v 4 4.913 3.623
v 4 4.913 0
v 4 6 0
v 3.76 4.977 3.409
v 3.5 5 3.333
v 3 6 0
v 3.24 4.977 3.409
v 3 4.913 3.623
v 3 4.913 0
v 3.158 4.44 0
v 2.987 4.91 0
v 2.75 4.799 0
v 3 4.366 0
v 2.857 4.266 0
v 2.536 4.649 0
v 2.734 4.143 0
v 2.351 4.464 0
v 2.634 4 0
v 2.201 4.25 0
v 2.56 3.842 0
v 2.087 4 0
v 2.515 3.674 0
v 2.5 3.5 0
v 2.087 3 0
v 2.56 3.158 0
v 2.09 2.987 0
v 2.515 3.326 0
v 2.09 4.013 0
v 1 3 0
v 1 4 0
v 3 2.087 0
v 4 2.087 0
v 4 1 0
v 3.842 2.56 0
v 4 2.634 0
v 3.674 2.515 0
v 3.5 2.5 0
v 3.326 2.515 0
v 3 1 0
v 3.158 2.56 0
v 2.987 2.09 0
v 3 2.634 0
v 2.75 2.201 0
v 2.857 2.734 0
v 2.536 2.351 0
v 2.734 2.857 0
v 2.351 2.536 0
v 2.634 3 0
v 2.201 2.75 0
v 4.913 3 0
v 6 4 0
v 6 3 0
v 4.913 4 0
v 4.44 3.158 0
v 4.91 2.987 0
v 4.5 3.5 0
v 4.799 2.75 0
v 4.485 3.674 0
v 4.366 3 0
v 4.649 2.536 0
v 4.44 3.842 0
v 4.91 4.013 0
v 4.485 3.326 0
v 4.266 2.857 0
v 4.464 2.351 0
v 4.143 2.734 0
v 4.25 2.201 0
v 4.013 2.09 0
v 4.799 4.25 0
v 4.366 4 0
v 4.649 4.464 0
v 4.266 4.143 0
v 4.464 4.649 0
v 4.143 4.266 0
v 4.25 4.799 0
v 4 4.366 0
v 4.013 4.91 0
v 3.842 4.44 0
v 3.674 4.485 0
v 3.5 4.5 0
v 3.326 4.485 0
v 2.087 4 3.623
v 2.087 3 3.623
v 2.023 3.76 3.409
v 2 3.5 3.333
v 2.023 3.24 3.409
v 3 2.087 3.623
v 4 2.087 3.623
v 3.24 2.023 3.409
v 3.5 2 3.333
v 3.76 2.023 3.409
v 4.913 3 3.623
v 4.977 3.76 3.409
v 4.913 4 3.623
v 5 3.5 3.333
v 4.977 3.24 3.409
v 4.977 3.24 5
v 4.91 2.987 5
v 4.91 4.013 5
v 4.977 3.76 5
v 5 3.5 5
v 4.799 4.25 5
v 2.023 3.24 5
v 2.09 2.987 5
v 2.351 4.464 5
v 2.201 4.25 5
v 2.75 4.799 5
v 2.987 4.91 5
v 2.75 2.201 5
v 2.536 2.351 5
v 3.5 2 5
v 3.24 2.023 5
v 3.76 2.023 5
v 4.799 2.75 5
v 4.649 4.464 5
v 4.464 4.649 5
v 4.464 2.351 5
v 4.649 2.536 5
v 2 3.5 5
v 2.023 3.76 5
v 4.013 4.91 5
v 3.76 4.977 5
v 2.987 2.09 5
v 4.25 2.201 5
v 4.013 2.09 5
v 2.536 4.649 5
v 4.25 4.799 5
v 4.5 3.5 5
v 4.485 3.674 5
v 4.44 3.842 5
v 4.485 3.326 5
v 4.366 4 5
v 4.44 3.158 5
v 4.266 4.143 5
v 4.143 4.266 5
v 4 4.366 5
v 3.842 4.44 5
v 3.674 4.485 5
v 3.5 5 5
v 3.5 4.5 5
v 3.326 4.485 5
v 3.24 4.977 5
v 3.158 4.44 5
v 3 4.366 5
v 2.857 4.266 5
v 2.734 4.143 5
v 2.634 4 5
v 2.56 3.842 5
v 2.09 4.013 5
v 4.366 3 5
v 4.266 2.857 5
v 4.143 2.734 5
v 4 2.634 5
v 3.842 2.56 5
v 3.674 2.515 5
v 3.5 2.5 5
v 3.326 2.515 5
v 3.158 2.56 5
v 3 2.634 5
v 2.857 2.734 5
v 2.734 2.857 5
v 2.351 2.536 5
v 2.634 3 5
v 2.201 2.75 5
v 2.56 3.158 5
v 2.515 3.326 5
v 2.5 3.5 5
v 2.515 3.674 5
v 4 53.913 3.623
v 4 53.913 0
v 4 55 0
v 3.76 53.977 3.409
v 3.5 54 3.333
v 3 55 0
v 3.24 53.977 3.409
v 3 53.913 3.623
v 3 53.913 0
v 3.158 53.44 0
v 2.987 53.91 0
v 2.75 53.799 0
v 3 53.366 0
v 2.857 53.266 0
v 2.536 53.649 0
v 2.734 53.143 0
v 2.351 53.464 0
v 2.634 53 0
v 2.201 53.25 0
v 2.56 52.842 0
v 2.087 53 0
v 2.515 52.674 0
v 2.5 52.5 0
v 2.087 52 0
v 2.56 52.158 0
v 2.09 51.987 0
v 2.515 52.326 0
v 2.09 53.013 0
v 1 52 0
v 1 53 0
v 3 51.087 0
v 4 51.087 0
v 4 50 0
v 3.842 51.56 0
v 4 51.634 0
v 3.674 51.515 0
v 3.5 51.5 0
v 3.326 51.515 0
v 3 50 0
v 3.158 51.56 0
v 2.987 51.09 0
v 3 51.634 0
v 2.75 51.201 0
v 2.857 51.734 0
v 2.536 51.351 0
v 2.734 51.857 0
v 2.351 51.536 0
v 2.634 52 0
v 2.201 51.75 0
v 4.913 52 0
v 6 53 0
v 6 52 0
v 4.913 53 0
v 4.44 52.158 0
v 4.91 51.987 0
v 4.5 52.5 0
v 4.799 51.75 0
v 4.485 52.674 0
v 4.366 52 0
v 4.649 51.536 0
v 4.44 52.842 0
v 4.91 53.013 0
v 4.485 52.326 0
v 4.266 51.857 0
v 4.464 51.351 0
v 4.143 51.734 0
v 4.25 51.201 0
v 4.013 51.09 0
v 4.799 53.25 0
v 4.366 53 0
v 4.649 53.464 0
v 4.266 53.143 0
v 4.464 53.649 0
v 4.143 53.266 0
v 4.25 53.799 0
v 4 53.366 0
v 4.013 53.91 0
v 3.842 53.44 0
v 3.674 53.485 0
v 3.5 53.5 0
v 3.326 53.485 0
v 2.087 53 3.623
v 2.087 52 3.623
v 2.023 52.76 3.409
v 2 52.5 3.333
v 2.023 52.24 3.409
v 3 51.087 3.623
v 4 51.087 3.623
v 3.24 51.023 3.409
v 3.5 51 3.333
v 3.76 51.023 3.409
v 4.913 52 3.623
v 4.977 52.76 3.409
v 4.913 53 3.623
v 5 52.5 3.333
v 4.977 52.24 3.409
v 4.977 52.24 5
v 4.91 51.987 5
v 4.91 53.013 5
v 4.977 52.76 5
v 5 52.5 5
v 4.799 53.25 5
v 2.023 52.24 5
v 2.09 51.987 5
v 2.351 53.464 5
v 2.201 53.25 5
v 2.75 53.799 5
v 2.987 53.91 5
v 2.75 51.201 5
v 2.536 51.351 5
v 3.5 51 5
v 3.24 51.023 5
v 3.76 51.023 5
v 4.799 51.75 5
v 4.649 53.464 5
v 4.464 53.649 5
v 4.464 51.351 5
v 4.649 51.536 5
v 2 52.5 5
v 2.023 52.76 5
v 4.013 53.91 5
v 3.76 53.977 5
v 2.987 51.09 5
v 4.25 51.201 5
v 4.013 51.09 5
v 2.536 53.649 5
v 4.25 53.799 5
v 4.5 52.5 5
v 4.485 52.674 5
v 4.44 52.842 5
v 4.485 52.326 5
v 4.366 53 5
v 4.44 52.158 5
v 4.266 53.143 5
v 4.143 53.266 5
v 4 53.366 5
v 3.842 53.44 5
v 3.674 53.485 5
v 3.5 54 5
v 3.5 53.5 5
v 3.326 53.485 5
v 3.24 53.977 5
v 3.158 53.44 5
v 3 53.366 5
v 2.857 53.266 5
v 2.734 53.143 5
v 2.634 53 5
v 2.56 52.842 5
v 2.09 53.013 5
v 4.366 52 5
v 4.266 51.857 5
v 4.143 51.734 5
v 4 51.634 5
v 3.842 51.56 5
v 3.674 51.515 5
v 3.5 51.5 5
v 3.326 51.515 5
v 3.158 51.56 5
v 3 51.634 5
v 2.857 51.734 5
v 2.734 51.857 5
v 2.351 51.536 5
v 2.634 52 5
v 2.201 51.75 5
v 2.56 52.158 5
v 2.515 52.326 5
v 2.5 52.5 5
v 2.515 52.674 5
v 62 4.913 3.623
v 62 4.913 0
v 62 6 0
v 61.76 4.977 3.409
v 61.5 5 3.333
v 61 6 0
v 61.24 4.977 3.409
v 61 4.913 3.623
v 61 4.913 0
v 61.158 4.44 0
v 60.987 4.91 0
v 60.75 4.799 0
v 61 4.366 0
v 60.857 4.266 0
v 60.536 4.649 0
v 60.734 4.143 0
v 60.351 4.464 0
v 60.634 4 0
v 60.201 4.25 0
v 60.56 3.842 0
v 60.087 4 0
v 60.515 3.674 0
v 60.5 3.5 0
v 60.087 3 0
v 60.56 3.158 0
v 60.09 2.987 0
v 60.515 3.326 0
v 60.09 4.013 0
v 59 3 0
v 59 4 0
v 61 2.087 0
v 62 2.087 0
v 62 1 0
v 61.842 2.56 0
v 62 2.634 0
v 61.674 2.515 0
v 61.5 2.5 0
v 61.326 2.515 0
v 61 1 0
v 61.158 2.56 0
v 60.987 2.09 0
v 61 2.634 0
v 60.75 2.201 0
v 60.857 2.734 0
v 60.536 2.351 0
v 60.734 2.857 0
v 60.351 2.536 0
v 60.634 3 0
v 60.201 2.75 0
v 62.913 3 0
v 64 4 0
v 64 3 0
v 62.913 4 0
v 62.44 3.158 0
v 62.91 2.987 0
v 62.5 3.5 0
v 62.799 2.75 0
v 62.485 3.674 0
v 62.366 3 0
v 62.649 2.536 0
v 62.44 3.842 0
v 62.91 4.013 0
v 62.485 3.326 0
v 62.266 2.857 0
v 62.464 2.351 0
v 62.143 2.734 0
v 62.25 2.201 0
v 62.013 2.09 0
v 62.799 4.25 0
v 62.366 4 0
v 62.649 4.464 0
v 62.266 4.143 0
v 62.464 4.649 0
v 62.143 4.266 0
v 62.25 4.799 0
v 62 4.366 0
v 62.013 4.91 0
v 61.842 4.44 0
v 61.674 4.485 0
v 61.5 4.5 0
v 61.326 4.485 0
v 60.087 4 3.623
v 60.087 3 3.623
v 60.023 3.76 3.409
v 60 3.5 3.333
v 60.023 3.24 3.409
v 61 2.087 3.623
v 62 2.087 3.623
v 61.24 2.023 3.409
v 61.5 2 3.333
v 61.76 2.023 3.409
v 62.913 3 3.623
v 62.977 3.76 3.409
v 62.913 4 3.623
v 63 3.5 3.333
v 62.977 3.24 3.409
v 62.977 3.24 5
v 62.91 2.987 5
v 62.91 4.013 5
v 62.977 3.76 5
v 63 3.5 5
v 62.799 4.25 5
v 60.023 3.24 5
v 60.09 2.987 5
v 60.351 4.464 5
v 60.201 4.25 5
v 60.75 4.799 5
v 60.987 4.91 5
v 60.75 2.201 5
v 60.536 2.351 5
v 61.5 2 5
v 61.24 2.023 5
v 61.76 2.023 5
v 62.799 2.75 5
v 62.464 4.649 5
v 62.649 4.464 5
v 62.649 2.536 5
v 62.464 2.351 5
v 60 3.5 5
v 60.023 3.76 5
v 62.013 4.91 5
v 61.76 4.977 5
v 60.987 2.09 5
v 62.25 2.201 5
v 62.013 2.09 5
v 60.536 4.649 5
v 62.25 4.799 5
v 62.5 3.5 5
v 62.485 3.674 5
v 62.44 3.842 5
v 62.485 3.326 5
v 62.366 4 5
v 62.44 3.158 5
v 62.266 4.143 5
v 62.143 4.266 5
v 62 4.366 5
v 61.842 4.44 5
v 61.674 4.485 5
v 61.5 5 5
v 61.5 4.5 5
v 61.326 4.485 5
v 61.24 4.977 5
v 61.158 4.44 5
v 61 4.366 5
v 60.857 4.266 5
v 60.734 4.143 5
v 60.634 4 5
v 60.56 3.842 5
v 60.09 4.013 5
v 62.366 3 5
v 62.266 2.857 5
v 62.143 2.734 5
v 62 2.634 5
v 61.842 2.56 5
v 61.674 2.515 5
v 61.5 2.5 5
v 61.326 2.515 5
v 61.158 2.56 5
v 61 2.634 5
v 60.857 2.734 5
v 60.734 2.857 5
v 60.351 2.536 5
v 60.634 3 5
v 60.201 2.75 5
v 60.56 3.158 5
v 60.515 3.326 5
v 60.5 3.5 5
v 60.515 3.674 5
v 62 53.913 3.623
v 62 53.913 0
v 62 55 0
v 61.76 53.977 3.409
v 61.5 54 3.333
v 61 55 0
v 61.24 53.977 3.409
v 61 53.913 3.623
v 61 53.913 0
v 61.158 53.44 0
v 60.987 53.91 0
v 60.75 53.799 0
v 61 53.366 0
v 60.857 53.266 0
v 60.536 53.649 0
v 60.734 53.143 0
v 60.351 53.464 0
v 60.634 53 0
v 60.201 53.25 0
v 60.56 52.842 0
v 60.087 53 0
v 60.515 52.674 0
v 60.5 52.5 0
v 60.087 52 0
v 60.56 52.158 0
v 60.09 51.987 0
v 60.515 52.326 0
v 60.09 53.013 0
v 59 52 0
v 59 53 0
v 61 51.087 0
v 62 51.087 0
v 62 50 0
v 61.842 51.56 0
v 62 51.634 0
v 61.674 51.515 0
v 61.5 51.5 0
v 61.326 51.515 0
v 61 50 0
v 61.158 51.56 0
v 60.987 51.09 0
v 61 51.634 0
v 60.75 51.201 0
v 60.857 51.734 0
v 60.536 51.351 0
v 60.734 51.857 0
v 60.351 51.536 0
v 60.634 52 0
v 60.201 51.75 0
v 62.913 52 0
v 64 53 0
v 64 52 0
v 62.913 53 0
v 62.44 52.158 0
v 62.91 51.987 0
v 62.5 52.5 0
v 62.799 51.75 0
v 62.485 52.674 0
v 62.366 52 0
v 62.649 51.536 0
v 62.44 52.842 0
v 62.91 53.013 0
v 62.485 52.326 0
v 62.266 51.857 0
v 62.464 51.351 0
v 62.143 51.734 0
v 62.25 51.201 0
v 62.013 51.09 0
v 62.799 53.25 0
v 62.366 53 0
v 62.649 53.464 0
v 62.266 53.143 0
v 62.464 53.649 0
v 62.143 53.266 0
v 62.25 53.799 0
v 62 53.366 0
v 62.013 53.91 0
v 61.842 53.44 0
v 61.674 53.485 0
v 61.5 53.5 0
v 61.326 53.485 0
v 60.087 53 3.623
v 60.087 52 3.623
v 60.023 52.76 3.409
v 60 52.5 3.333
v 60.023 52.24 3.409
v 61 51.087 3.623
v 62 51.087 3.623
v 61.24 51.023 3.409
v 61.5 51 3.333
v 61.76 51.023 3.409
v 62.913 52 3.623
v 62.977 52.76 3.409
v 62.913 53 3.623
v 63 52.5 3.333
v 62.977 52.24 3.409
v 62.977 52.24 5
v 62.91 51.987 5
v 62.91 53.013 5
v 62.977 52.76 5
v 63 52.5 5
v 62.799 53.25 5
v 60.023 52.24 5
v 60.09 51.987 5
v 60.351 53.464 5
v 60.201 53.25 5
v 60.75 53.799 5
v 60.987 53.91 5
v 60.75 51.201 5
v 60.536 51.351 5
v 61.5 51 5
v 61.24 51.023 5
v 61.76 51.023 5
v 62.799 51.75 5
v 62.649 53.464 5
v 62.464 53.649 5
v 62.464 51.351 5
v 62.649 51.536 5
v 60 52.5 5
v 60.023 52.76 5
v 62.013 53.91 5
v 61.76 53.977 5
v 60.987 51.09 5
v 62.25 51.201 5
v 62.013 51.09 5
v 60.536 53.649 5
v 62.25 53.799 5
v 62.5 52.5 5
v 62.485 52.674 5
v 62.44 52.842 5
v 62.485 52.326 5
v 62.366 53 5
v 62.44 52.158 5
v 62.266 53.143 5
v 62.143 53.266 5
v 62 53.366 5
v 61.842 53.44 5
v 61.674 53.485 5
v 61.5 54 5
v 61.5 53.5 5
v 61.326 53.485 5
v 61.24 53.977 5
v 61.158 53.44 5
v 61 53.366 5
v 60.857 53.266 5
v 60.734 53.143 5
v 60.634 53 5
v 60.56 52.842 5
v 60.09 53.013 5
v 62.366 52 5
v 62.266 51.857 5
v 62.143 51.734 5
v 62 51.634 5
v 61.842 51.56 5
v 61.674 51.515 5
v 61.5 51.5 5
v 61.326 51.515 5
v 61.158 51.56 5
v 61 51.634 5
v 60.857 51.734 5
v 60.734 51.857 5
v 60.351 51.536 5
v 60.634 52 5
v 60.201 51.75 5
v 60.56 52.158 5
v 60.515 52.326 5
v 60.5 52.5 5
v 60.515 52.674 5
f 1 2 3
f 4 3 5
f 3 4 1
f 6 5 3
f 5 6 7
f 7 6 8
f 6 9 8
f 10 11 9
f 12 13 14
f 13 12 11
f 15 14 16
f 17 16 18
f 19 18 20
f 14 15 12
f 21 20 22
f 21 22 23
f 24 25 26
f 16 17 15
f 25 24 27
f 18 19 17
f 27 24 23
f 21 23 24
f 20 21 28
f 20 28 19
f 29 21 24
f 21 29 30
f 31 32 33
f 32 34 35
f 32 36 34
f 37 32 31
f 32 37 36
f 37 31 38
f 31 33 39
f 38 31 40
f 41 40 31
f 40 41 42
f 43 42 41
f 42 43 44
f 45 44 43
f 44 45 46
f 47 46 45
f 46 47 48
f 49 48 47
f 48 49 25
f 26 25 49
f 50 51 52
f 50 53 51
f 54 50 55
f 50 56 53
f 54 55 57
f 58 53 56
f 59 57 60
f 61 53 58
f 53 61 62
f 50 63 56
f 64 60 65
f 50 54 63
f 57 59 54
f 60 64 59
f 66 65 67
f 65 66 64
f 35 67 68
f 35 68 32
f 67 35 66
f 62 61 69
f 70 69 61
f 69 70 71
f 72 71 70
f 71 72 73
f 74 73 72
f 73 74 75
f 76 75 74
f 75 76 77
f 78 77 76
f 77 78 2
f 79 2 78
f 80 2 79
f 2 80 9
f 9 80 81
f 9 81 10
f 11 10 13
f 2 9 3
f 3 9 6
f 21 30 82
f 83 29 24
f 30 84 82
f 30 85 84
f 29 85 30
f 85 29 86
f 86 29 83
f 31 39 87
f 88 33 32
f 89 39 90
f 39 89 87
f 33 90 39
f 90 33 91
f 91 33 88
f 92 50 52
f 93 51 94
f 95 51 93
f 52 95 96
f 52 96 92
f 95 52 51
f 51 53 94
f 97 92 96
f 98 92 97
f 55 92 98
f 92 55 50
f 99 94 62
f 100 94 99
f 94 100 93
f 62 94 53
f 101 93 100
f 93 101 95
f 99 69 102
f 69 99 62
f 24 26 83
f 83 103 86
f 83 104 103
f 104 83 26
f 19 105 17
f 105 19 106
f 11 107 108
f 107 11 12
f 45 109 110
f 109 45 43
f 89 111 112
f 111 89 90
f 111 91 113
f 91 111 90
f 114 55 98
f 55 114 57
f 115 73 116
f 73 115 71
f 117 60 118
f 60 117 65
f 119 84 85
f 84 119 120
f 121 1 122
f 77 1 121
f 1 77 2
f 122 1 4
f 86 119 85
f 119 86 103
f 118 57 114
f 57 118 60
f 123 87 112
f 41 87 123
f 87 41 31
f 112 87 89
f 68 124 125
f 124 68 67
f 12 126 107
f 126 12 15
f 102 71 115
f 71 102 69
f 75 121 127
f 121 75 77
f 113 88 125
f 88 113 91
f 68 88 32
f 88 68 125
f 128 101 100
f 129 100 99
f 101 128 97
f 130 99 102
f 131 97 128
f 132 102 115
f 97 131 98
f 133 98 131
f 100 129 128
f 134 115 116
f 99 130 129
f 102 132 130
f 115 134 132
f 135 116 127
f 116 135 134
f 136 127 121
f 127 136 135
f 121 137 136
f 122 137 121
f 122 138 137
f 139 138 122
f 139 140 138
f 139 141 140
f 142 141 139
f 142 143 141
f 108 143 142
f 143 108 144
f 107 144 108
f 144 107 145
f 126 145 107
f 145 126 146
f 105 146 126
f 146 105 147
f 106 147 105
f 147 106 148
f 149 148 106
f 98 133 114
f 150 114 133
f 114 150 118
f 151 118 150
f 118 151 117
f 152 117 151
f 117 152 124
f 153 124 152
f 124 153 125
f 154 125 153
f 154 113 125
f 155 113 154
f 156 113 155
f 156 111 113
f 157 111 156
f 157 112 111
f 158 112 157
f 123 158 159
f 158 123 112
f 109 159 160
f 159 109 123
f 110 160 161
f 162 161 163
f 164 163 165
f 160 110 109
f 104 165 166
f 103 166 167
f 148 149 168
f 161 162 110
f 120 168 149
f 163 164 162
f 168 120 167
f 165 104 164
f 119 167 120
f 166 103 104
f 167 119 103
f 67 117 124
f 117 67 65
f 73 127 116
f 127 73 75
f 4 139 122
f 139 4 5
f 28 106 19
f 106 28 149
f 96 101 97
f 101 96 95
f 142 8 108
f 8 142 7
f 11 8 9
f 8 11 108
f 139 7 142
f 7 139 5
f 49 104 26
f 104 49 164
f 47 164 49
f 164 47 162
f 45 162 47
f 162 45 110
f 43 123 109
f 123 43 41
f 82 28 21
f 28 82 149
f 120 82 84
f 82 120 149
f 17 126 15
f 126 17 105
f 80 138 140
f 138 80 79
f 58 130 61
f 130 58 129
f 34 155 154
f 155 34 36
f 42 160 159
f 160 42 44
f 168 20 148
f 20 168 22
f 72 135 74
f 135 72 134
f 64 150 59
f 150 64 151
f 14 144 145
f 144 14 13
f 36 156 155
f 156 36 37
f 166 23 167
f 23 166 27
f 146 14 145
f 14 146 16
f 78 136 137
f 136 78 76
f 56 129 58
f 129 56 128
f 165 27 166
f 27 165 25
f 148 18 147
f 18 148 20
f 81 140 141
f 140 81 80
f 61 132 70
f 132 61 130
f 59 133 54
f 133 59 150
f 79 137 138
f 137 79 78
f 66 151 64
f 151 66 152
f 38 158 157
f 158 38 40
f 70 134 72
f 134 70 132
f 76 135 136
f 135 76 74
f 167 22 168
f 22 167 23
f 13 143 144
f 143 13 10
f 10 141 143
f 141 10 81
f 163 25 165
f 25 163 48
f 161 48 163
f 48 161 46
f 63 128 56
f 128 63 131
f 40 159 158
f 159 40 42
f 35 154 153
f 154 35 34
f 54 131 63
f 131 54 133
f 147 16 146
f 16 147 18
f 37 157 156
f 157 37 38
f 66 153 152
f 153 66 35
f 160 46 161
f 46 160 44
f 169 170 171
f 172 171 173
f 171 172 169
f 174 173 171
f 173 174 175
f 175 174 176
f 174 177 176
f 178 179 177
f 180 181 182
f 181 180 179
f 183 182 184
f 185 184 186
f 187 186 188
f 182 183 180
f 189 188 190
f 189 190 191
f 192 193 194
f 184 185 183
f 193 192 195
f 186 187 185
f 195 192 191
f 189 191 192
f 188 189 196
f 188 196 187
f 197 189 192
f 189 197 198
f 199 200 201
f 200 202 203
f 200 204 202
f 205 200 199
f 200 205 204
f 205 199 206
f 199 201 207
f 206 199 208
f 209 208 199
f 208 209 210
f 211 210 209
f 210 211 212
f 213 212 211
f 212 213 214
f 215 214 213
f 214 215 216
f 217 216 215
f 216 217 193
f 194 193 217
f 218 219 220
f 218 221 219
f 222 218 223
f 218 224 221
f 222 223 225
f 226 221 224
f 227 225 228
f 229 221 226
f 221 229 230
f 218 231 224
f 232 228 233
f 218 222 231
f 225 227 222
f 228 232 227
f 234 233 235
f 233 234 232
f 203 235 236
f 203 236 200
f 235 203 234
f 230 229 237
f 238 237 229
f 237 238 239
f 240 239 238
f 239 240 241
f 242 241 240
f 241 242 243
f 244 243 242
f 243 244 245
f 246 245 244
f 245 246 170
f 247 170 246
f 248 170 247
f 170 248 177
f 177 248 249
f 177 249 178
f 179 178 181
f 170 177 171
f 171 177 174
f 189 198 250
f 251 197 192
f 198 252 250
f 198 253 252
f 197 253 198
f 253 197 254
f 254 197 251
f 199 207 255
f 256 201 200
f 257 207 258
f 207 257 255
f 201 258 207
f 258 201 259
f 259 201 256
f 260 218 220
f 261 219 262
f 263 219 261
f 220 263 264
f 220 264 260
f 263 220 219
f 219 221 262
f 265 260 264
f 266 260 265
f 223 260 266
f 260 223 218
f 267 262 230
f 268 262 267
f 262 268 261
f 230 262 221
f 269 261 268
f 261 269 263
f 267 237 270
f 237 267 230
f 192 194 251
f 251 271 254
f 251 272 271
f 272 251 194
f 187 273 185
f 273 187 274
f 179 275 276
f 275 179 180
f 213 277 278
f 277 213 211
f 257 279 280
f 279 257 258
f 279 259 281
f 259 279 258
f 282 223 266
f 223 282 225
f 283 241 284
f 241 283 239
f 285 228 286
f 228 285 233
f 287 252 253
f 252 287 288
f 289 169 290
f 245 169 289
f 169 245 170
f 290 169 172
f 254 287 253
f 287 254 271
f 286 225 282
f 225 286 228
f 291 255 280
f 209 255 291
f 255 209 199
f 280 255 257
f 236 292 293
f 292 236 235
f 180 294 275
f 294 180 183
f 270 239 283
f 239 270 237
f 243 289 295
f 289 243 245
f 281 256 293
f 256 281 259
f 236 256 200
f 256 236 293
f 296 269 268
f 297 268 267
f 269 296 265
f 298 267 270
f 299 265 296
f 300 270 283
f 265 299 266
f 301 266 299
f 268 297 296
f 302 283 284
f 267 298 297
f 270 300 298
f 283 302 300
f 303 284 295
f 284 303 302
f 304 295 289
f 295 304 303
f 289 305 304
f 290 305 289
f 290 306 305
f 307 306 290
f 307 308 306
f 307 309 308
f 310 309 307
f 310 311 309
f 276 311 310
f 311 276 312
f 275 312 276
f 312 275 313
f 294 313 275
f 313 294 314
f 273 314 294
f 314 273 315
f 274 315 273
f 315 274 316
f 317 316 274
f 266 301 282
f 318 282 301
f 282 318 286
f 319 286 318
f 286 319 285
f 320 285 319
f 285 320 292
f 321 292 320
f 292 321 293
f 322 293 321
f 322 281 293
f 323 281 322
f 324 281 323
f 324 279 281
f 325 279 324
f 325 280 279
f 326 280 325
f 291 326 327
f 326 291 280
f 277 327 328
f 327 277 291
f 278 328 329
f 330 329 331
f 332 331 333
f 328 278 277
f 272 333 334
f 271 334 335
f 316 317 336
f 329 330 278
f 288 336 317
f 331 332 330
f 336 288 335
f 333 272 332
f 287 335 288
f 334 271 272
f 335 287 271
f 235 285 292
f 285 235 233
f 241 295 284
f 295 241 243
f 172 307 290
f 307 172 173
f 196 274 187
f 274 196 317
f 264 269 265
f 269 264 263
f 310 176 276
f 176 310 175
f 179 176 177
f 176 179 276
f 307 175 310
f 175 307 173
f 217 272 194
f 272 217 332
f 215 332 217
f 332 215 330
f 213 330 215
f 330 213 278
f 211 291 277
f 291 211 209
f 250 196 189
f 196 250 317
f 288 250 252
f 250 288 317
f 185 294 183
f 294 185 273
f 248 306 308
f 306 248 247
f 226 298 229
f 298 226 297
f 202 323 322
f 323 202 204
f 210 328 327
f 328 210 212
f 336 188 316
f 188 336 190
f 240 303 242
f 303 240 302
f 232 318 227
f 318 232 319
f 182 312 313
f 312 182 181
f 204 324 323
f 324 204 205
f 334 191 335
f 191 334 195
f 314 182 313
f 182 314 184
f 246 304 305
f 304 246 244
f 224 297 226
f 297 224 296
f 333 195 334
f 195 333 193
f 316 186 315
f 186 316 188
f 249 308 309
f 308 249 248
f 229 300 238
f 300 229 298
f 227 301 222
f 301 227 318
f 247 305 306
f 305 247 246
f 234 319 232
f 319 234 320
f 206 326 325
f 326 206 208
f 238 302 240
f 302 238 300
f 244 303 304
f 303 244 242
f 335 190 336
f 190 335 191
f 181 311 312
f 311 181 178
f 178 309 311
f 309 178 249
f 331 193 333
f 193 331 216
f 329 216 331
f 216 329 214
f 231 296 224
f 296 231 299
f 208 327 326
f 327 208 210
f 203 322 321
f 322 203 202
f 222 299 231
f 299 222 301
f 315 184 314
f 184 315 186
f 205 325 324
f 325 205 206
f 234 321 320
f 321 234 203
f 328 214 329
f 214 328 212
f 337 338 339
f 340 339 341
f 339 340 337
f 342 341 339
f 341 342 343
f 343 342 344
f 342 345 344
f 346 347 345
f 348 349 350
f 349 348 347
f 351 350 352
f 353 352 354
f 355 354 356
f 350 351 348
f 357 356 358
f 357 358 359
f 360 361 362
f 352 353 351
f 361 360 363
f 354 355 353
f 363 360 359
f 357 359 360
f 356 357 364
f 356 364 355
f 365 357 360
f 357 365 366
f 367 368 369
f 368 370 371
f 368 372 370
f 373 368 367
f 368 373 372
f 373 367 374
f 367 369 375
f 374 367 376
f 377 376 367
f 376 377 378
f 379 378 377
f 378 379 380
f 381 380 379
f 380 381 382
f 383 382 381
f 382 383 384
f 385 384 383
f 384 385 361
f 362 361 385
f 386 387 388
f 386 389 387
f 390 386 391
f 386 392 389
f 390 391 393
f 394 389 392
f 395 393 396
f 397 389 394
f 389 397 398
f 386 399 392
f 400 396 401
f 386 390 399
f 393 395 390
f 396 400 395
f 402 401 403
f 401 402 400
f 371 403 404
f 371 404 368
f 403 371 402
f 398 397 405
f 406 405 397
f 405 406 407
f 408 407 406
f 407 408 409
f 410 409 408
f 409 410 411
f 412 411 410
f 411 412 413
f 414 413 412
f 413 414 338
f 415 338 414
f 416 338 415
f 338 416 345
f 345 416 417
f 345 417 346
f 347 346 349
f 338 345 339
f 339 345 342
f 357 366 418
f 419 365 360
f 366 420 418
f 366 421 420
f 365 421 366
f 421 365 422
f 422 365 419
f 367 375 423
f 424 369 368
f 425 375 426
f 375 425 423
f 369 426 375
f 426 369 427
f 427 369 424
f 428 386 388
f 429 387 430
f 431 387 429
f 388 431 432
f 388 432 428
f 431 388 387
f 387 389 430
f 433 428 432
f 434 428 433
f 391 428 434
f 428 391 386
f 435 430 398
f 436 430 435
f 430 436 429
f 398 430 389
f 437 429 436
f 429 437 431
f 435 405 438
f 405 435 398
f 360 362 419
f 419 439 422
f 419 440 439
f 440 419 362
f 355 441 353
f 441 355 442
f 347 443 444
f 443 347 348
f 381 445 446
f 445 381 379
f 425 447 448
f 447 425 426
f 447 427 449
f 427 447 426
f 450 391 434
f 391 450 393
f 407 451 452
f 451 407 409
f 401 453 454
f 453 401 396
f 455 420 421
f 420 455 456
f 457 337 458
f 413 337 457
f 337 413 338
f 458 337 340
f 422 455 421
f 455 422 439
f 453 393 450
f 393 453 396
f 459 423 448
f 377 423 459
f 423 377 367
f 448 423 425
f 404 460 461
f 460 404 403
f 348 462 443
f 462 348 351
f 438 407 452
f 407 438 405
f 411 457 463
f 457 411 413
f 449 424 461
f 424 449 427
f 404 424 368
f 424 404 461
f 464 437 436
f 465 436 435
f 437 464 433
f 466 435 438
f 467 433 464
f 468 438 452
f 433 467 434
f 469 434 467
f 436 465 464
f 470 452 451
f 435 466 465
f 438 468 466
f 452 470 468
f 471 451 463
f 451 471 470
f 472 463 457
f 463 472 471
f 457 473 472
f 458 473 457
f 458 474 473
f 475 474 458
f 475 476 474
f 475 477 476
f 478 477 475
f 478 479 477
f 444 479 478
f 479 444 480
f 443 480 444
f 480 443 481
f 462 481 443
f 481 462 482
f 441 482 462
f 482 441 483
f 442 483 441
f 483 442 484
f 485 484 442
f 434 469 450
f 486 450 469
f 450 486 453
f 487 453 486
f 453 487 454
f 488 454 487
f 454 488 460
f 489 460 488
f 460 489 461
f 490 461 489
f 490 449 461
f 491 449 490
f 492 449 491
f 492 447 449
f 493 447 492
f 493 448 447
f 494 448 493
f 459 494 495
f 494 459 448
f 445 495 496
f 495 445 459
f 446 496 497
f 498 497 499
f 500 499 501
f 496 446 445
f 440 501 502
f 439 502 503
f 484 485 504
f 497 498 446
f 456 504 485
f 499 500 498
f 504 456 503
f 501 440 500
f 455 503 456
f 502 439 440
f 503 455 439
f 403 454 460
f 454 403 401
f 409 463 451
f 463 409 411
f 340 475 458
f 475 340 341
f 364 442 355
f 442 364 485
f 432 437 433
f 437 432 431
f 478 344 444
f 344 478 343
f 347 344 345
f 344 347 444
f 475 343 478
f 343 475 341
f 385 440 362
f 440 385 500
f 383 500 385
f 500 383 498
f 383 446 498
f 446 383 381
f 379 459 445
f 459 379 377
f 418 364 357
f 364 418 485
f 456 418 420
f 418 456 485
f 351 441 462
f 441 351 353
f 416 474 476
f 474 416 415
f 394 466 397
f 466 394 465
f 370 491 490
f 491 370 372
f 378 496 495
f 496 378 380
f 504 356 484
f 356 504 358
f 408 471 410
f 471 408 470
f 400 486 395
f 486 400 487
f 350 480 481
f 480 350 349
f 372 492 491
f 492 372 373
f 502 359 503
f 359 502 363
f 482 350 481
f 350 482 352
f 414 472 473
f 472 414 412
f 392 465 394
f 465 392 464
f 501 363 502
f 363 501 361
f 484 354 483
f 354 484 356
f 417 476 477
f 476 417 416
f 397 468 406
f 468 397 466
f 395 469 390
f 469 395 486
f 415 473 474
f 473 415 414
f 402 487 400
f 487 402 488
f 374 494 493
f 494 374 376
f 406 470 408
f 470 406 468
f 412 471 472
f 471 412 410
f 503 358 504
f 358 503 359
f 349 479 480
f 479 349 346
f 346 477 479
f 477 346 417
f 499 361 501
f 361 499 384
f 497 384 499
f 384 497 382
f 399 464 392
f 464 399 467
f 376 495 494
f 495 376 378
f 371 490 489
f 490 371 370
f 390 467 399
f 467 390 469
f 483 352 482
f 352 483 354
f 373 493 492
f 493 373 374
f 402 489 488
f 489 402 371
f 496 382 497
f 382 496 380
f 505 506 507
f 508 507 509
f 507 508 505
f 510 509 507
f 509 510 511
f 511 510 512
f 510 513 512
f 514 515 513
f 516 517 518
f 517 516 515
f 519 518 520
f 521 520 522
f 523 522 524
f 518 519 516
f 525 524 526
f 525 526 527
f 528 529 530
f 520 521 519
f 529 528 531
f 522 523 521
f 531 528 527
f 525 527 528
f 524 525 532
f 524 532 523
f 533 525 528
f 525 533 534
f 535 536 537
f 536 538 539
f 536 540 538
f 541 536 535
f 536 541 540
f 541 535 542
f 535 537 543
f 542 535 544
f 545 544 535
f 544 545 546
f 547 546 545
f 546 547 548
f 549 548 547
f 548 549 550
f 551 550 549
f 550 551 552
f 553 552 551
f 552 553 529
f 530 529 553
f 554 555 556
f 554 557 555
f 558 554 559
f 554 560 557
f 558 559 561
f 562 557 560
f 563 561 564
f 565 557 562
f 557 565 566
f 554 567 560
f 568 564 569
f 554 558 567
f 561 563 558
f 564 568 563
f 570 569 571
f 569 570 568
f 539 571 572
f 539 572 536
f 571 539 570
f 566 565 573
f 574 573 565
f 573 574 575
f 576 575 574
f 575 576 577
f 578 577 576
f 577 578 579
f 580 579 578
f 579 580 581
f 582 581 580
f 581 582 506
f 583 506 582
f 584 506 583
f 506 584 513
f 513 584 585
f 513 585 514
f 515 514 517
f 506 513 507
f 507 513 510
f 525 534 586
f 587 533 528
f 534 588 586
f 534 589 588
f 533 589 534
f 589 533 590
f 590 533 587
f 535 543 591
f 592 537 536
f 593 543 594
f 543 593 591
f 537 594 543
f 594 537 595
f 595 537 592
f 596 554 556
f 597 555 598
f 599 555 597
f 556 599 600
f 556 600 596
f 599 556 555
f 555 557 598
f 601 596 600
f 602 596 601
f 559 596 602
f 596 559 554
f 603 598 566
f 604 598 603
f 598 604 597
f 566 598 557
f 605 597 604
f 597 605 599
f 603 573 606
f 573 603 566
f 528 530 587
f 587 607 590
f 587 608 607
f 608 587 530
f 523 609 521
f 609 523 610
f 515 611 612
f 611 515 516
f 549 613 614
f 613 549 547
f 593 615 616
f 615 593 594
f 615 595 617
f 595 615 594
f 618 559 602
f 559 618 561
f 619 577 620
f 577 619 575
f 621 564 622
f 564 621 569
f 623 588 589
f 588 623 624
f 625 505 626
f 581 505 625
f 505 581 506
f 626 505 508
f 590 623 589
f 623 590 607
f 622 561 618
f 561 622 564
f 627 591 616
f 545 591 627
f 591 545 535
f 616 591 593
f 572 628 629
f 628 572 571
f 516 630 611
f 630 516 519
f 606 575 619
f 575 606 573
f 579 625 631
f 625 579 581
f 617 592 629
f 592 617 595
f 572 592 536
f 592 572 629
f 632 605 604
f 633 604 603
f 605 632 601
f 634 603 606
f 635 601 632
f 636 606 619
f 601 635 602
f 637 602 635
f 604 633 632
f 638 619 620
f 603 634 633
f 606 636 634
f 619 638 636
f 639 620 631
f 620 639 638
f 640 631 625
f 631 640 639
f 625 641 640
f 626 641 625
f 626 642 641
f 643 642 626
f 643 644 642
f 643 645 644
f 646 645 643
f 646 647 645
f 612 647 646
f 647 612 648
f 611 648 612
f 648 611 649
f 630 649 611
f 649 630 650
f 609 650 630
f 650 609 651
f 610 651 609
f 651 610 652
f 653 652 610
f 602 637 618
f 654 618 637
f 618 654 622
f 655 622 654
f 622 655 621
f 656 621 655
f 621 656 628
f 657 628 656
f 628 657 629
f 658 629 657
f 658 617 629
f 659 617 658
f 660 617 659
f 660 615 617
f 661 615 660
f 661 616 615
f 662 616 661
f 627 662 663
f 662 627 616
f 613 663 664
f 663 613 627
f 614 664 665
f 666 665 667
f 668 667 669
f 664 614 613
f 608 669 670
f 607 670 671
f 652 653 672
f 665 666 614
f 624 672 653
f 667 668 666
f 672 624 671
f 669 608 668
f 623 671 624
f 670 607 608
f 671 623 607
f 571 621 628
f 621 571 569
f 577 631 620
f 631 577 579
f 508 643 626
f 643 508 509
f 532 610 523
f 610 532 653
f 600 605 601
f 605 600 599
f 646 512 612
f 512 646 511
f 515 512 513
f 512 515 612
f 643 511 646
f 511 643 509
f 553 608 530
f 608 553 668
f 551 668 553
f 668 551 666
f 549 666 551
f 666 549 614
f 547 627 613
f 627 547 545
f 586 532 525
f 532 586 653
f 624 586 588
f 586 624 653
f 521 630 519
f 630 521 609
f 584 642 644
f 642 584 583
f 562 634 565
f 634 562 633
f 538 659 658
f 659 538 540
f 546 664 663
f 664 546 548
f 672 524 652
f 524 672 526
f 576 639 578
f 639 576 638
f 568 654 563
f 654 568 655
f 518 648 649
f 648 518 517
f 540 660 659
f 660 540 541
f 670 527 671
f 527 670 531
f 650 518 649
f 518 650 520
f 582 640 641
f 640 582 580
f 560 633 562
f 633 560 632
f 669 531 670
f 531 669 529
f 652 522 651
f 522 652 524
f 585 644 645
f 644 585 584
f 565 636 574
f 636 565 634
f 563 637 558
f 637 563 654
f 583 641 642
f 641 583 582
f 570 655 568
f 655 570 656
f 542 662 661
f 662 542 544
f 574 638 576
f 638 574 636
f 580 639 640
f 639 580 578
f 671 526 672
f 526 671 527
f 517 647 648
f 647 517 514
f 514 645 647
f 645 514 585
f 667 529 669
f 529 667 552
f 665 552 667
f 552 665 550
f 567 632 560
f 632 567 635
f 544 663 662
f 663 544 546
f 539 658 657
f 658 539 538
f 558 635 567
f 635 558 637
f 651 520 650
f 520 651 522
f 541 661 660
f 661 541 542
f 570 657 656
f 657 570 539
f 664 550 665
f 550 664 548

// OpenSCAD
// file: posts.scad
/* Developed by Alex Grutter */

$fn = 36;

four_posts_with_supports(10, 3, 2, 25, 50, 5, 1, [0,0,0,0], 1, true);

module four_posts(post_height, post_outer_diameter, post_inner_diameter, post_spacing_width, post_spacing_length){
    difference()
    {
		/* Outer part */
		union()
		{
            translate([0, 0, 0])
            {
                cylinder(h = post_height, d = post_outer_diameter);
            }
            translate([0, post_spacing_length + 0, 0])
            {
                cylinder(h = post_height, d = post_outer_diameter);
            }
            translate([post_spacing_width + 0, 0, 0])
            {
                cylinder(h = post_height, d = post_outer_diameter);
            }
            translate([post_spacing_width + 0, post_spacing_length + 0, 0])
            {
                cylinder(h = post_height, d = post_outer_diameter);
            }
		}
		/* Inner hole */
        union()
        {
            translate([0, 0, -1])
            {
                cylinder(h = post_height+2, d = post_inner_diameter);
            }
            translate([0, post_spacing_length + 0, -1])
            {
                cylinder(h = post_height+2, d = post_inner_diameter);
            }
            translate([post_spacing_width + 0, 0, -1])
            {
                cylinder(h = post_height+2, d = post_inner_diameter);
            }
            translate([post_spacing_width + 0, post_spacing_length + 0, -1])
            {
                cylinder(h = post_height+2, d = post_inner_diameter);
            }
        }
	}
};

module four_posts_with_supports(post_height, post_outer_diameter, post_inner_diameter, post_spacing_width, post_spacing_length, support_diameter, support_count, support_start_angle, support_thickness, flip){
    difference()
    {
		/* Outer part */
		union()
		{
            translate([0, 0, 0])
            {
                cylinder(h = post_height, d = post_outer_diameter);
				for(support = [0 : support_count])
				{
					if(flip)
					{
						translate([0, 0, post_height])
						rotate([support_start_angle[0] + ( support * (360 / support_count)),90,0])
						translate([0, 0, -(support_thickness / 2)])
						linear_extrude(support_thickness)
						polygon([[post_height, (post_inner_diameter / 2)],[0, (post_inner_diameter / 2)],[0,(support_diameter / 2)]], [[0,1,2]]);
					}
					else
					{
						rotate([support_start_angle[0] + ( support * (360 / support_count)),-90,0])
						translate([0, 0, -(support_thickness / 2)])
						linear_extrude(support_thickness)
						polygon([[post_height, (post_inner_diameter / 2)],[0, (post_inner_diameter / 2)],[0, (support_diameter / 2)]], [[0,1,2]]);
					}
				}
            }
            translate([0, post_spacing_length + 0, 0])
            {
                cylinder(h = post_height, d = post_outer_diameter);
				for(support = [0 : support_count])
				{
					if(flip)
					{
						translate([0, 0, post_height])
						rotate([support_start_angle[1] + ( support * (360 / support_count)),90,0])
						translate([0, 0, -(support_thickness / 2)])
						linear_extrude(support_thickness)
						polygon([[post_height, (post_inner_diameter / 2)],[0, (post_inner_diameter / 2)],[0,(support_diameter / 2)]], [[0,1,2]]);
					}
					else
					{
						rotate([support_start_angle[1] + ( support * (360 / support_count)),-90,0])
						translate([0, 0, -(support_thickness / 2)])
						linear_extrude(support_thickness)
						polygon([[post_height, (post_inner_diameter / 2)],[0, (post_inner_diameter / 2)],[0,(support_diameter / 2)]], [[0,1,2]]);
					}
				}
            }
            translate([post_spacing_width + 0, 0, 0])
            {
                cylinder(h = post_height, d = post_outer_diameter);
				for(support = [0 : support_count])
				{
					if(flip)
					{
						translate([0, 0, post_height])
						rotate([support_start_angle[2] + ( support * (360 / support_count)),90,0])
						translate([0, 0, -(support_thickness / 2)])
						linear_extrude(support_thickness)
						polygon([[post_height, (post_inner_diameter / 2)],[0, (post_inner_diameter / 2)],[0,(support_diameter / 2)]], [[0,1,2]]);
					}
					else
					{
						rotate([support_start_angle[2] + ( support * (360 / support_count)),-90,0])
						translate([0, 0, -(support_thickness / 2)])
						linear_extrude(support_thickness)
						polygon([[post_height, (post_inner_diameter / 2)],[0, (post_inner_diameter / 2)],[0,(support_diameter / 2)]], [[0,1,2]]);
					}
				}
            }
            translate([post_spacing_width + 0, post_spacing_length + 0, 0])
            {
                cylinder(h = post_height, d = post_outer_diameter);
				for(support = [0 : support_count])
				{
					if(flip)
					{
						translate([0, 0, post_height])
						rotate([support_start_angle[3] + ( support * (360 / support_count)),90,0])
						translate([0, 0, -(support_thickness / 2)])
						linear_extrude(support_thickness)
						polygon([[post_height, (post_inner_diameter / 2)],[0, (post_inner_diameter / 2)],[0,(support_diameter / 2)]], [[0,1,2]]);
					}
					else
					{
						rotate([support_start_angle[3] + ( support * (360 / support_count)),-90,0])
						translate([0, 0, -(support_thickness / 2)])
						linear_extrude(support_thickness)
						polygon([[post_height, (post_inner_diameter / 2)],[0, (post_inner_diameter / 2)],[0,(support_diameter / 2)]], [[0,1,2]]);
					}
				}
            }
		}
        
		/* Inner hole */
        union()
        {
            translate([0, 0, -1])
            {
                cylinder(h = post_height+2, d = post_inner_diameter);
            }
            translate([0, post_spacing_length + 0, -1])
            {
                cylinder(h = post_height+2, d = post_inner_diameter);
            }
            translate([post_spacing_width + 0, 0, -1])
            {
                cylinder(h = post_height+2, d = post_inner_diameter);
            }
            translate([post_spacing_width + 0, post_spacing_length + 0, -1])
            {
                cylinder(h = post_height+2, d = post_inner_diameter);
            }
        }
	}
};
// main file
use <posts.scad>

/* Examples for viewing */
raspberry_pi_model_b_plus_posts();

module raspberry_pi_model_b_plus_posts()
{
    /* Post parameters */
    post_height                 = 5;
    post_outer_diameter         = 3;
    post_inner_diameter         = 2;
    
    /* Post support parameters */
    support_diameter            = 5;
    support_count               = 4;
    support_start_angle         = [0,0,0,0];
    support_thickness           = 1;
    support_flip                = false;
    
    /* Length positioning parameters */
    hole1_offset_length         = 3.5;
    hole2_offset_length         = hole1_offset_length;
    hole3_offset_length         = 3.5 + 58;
    hole4_offset_length         = hole3_offset_length;
    
    /* Width positioning parameters */
    hole1_offset_width          = 3.5 + 49;
    hole2_offset_width          = 3.5;
    hole3_offset_width          = hole1_offset_width;
    hole4_offset_width          = hole2_offset_width;
    
    board_width                 = 56;

    /* Hole 1: */
    translate([hole1_offset_length, board_width - hole1_offset_width, 0])
    four_posts_with_supports(post_height, post_outer_diameter, post_inner_diameter, 0, 0, support_diameter, support_count, support_start_angle, support_thickness, support_flip);
    
    /* Hole 2: */
    translate([hole2_offset_length, board_width - hole2_offset_width, 0])
    four_posts_with_supports(post_height, post_outer_diameter, post_inner_diameter, 0, 0, support_diameter, support_count, support_start_angle, support_thickness, support_flip);
        
    /* Hole 3: */
    translate([hole3_offset_length, board_width - hole3_offset_width, 0])
    four_posts_with_supports(post_height, post_outer_diameter, post_inner_diameter, 0, 0, support_diameter, support_count, support_start_angle, support_thickness, support_flip);
    
    /* Hole 4: */
    translate([hole4_offset_length, board_width - hole4_offset_width, 0])
    four_posts_with_supports(post_height, post_outer_diameter, post_inner_diameter, 0, 0, support_diameter, support_count, support_start_angle, support_thickness, support_flip);
}
